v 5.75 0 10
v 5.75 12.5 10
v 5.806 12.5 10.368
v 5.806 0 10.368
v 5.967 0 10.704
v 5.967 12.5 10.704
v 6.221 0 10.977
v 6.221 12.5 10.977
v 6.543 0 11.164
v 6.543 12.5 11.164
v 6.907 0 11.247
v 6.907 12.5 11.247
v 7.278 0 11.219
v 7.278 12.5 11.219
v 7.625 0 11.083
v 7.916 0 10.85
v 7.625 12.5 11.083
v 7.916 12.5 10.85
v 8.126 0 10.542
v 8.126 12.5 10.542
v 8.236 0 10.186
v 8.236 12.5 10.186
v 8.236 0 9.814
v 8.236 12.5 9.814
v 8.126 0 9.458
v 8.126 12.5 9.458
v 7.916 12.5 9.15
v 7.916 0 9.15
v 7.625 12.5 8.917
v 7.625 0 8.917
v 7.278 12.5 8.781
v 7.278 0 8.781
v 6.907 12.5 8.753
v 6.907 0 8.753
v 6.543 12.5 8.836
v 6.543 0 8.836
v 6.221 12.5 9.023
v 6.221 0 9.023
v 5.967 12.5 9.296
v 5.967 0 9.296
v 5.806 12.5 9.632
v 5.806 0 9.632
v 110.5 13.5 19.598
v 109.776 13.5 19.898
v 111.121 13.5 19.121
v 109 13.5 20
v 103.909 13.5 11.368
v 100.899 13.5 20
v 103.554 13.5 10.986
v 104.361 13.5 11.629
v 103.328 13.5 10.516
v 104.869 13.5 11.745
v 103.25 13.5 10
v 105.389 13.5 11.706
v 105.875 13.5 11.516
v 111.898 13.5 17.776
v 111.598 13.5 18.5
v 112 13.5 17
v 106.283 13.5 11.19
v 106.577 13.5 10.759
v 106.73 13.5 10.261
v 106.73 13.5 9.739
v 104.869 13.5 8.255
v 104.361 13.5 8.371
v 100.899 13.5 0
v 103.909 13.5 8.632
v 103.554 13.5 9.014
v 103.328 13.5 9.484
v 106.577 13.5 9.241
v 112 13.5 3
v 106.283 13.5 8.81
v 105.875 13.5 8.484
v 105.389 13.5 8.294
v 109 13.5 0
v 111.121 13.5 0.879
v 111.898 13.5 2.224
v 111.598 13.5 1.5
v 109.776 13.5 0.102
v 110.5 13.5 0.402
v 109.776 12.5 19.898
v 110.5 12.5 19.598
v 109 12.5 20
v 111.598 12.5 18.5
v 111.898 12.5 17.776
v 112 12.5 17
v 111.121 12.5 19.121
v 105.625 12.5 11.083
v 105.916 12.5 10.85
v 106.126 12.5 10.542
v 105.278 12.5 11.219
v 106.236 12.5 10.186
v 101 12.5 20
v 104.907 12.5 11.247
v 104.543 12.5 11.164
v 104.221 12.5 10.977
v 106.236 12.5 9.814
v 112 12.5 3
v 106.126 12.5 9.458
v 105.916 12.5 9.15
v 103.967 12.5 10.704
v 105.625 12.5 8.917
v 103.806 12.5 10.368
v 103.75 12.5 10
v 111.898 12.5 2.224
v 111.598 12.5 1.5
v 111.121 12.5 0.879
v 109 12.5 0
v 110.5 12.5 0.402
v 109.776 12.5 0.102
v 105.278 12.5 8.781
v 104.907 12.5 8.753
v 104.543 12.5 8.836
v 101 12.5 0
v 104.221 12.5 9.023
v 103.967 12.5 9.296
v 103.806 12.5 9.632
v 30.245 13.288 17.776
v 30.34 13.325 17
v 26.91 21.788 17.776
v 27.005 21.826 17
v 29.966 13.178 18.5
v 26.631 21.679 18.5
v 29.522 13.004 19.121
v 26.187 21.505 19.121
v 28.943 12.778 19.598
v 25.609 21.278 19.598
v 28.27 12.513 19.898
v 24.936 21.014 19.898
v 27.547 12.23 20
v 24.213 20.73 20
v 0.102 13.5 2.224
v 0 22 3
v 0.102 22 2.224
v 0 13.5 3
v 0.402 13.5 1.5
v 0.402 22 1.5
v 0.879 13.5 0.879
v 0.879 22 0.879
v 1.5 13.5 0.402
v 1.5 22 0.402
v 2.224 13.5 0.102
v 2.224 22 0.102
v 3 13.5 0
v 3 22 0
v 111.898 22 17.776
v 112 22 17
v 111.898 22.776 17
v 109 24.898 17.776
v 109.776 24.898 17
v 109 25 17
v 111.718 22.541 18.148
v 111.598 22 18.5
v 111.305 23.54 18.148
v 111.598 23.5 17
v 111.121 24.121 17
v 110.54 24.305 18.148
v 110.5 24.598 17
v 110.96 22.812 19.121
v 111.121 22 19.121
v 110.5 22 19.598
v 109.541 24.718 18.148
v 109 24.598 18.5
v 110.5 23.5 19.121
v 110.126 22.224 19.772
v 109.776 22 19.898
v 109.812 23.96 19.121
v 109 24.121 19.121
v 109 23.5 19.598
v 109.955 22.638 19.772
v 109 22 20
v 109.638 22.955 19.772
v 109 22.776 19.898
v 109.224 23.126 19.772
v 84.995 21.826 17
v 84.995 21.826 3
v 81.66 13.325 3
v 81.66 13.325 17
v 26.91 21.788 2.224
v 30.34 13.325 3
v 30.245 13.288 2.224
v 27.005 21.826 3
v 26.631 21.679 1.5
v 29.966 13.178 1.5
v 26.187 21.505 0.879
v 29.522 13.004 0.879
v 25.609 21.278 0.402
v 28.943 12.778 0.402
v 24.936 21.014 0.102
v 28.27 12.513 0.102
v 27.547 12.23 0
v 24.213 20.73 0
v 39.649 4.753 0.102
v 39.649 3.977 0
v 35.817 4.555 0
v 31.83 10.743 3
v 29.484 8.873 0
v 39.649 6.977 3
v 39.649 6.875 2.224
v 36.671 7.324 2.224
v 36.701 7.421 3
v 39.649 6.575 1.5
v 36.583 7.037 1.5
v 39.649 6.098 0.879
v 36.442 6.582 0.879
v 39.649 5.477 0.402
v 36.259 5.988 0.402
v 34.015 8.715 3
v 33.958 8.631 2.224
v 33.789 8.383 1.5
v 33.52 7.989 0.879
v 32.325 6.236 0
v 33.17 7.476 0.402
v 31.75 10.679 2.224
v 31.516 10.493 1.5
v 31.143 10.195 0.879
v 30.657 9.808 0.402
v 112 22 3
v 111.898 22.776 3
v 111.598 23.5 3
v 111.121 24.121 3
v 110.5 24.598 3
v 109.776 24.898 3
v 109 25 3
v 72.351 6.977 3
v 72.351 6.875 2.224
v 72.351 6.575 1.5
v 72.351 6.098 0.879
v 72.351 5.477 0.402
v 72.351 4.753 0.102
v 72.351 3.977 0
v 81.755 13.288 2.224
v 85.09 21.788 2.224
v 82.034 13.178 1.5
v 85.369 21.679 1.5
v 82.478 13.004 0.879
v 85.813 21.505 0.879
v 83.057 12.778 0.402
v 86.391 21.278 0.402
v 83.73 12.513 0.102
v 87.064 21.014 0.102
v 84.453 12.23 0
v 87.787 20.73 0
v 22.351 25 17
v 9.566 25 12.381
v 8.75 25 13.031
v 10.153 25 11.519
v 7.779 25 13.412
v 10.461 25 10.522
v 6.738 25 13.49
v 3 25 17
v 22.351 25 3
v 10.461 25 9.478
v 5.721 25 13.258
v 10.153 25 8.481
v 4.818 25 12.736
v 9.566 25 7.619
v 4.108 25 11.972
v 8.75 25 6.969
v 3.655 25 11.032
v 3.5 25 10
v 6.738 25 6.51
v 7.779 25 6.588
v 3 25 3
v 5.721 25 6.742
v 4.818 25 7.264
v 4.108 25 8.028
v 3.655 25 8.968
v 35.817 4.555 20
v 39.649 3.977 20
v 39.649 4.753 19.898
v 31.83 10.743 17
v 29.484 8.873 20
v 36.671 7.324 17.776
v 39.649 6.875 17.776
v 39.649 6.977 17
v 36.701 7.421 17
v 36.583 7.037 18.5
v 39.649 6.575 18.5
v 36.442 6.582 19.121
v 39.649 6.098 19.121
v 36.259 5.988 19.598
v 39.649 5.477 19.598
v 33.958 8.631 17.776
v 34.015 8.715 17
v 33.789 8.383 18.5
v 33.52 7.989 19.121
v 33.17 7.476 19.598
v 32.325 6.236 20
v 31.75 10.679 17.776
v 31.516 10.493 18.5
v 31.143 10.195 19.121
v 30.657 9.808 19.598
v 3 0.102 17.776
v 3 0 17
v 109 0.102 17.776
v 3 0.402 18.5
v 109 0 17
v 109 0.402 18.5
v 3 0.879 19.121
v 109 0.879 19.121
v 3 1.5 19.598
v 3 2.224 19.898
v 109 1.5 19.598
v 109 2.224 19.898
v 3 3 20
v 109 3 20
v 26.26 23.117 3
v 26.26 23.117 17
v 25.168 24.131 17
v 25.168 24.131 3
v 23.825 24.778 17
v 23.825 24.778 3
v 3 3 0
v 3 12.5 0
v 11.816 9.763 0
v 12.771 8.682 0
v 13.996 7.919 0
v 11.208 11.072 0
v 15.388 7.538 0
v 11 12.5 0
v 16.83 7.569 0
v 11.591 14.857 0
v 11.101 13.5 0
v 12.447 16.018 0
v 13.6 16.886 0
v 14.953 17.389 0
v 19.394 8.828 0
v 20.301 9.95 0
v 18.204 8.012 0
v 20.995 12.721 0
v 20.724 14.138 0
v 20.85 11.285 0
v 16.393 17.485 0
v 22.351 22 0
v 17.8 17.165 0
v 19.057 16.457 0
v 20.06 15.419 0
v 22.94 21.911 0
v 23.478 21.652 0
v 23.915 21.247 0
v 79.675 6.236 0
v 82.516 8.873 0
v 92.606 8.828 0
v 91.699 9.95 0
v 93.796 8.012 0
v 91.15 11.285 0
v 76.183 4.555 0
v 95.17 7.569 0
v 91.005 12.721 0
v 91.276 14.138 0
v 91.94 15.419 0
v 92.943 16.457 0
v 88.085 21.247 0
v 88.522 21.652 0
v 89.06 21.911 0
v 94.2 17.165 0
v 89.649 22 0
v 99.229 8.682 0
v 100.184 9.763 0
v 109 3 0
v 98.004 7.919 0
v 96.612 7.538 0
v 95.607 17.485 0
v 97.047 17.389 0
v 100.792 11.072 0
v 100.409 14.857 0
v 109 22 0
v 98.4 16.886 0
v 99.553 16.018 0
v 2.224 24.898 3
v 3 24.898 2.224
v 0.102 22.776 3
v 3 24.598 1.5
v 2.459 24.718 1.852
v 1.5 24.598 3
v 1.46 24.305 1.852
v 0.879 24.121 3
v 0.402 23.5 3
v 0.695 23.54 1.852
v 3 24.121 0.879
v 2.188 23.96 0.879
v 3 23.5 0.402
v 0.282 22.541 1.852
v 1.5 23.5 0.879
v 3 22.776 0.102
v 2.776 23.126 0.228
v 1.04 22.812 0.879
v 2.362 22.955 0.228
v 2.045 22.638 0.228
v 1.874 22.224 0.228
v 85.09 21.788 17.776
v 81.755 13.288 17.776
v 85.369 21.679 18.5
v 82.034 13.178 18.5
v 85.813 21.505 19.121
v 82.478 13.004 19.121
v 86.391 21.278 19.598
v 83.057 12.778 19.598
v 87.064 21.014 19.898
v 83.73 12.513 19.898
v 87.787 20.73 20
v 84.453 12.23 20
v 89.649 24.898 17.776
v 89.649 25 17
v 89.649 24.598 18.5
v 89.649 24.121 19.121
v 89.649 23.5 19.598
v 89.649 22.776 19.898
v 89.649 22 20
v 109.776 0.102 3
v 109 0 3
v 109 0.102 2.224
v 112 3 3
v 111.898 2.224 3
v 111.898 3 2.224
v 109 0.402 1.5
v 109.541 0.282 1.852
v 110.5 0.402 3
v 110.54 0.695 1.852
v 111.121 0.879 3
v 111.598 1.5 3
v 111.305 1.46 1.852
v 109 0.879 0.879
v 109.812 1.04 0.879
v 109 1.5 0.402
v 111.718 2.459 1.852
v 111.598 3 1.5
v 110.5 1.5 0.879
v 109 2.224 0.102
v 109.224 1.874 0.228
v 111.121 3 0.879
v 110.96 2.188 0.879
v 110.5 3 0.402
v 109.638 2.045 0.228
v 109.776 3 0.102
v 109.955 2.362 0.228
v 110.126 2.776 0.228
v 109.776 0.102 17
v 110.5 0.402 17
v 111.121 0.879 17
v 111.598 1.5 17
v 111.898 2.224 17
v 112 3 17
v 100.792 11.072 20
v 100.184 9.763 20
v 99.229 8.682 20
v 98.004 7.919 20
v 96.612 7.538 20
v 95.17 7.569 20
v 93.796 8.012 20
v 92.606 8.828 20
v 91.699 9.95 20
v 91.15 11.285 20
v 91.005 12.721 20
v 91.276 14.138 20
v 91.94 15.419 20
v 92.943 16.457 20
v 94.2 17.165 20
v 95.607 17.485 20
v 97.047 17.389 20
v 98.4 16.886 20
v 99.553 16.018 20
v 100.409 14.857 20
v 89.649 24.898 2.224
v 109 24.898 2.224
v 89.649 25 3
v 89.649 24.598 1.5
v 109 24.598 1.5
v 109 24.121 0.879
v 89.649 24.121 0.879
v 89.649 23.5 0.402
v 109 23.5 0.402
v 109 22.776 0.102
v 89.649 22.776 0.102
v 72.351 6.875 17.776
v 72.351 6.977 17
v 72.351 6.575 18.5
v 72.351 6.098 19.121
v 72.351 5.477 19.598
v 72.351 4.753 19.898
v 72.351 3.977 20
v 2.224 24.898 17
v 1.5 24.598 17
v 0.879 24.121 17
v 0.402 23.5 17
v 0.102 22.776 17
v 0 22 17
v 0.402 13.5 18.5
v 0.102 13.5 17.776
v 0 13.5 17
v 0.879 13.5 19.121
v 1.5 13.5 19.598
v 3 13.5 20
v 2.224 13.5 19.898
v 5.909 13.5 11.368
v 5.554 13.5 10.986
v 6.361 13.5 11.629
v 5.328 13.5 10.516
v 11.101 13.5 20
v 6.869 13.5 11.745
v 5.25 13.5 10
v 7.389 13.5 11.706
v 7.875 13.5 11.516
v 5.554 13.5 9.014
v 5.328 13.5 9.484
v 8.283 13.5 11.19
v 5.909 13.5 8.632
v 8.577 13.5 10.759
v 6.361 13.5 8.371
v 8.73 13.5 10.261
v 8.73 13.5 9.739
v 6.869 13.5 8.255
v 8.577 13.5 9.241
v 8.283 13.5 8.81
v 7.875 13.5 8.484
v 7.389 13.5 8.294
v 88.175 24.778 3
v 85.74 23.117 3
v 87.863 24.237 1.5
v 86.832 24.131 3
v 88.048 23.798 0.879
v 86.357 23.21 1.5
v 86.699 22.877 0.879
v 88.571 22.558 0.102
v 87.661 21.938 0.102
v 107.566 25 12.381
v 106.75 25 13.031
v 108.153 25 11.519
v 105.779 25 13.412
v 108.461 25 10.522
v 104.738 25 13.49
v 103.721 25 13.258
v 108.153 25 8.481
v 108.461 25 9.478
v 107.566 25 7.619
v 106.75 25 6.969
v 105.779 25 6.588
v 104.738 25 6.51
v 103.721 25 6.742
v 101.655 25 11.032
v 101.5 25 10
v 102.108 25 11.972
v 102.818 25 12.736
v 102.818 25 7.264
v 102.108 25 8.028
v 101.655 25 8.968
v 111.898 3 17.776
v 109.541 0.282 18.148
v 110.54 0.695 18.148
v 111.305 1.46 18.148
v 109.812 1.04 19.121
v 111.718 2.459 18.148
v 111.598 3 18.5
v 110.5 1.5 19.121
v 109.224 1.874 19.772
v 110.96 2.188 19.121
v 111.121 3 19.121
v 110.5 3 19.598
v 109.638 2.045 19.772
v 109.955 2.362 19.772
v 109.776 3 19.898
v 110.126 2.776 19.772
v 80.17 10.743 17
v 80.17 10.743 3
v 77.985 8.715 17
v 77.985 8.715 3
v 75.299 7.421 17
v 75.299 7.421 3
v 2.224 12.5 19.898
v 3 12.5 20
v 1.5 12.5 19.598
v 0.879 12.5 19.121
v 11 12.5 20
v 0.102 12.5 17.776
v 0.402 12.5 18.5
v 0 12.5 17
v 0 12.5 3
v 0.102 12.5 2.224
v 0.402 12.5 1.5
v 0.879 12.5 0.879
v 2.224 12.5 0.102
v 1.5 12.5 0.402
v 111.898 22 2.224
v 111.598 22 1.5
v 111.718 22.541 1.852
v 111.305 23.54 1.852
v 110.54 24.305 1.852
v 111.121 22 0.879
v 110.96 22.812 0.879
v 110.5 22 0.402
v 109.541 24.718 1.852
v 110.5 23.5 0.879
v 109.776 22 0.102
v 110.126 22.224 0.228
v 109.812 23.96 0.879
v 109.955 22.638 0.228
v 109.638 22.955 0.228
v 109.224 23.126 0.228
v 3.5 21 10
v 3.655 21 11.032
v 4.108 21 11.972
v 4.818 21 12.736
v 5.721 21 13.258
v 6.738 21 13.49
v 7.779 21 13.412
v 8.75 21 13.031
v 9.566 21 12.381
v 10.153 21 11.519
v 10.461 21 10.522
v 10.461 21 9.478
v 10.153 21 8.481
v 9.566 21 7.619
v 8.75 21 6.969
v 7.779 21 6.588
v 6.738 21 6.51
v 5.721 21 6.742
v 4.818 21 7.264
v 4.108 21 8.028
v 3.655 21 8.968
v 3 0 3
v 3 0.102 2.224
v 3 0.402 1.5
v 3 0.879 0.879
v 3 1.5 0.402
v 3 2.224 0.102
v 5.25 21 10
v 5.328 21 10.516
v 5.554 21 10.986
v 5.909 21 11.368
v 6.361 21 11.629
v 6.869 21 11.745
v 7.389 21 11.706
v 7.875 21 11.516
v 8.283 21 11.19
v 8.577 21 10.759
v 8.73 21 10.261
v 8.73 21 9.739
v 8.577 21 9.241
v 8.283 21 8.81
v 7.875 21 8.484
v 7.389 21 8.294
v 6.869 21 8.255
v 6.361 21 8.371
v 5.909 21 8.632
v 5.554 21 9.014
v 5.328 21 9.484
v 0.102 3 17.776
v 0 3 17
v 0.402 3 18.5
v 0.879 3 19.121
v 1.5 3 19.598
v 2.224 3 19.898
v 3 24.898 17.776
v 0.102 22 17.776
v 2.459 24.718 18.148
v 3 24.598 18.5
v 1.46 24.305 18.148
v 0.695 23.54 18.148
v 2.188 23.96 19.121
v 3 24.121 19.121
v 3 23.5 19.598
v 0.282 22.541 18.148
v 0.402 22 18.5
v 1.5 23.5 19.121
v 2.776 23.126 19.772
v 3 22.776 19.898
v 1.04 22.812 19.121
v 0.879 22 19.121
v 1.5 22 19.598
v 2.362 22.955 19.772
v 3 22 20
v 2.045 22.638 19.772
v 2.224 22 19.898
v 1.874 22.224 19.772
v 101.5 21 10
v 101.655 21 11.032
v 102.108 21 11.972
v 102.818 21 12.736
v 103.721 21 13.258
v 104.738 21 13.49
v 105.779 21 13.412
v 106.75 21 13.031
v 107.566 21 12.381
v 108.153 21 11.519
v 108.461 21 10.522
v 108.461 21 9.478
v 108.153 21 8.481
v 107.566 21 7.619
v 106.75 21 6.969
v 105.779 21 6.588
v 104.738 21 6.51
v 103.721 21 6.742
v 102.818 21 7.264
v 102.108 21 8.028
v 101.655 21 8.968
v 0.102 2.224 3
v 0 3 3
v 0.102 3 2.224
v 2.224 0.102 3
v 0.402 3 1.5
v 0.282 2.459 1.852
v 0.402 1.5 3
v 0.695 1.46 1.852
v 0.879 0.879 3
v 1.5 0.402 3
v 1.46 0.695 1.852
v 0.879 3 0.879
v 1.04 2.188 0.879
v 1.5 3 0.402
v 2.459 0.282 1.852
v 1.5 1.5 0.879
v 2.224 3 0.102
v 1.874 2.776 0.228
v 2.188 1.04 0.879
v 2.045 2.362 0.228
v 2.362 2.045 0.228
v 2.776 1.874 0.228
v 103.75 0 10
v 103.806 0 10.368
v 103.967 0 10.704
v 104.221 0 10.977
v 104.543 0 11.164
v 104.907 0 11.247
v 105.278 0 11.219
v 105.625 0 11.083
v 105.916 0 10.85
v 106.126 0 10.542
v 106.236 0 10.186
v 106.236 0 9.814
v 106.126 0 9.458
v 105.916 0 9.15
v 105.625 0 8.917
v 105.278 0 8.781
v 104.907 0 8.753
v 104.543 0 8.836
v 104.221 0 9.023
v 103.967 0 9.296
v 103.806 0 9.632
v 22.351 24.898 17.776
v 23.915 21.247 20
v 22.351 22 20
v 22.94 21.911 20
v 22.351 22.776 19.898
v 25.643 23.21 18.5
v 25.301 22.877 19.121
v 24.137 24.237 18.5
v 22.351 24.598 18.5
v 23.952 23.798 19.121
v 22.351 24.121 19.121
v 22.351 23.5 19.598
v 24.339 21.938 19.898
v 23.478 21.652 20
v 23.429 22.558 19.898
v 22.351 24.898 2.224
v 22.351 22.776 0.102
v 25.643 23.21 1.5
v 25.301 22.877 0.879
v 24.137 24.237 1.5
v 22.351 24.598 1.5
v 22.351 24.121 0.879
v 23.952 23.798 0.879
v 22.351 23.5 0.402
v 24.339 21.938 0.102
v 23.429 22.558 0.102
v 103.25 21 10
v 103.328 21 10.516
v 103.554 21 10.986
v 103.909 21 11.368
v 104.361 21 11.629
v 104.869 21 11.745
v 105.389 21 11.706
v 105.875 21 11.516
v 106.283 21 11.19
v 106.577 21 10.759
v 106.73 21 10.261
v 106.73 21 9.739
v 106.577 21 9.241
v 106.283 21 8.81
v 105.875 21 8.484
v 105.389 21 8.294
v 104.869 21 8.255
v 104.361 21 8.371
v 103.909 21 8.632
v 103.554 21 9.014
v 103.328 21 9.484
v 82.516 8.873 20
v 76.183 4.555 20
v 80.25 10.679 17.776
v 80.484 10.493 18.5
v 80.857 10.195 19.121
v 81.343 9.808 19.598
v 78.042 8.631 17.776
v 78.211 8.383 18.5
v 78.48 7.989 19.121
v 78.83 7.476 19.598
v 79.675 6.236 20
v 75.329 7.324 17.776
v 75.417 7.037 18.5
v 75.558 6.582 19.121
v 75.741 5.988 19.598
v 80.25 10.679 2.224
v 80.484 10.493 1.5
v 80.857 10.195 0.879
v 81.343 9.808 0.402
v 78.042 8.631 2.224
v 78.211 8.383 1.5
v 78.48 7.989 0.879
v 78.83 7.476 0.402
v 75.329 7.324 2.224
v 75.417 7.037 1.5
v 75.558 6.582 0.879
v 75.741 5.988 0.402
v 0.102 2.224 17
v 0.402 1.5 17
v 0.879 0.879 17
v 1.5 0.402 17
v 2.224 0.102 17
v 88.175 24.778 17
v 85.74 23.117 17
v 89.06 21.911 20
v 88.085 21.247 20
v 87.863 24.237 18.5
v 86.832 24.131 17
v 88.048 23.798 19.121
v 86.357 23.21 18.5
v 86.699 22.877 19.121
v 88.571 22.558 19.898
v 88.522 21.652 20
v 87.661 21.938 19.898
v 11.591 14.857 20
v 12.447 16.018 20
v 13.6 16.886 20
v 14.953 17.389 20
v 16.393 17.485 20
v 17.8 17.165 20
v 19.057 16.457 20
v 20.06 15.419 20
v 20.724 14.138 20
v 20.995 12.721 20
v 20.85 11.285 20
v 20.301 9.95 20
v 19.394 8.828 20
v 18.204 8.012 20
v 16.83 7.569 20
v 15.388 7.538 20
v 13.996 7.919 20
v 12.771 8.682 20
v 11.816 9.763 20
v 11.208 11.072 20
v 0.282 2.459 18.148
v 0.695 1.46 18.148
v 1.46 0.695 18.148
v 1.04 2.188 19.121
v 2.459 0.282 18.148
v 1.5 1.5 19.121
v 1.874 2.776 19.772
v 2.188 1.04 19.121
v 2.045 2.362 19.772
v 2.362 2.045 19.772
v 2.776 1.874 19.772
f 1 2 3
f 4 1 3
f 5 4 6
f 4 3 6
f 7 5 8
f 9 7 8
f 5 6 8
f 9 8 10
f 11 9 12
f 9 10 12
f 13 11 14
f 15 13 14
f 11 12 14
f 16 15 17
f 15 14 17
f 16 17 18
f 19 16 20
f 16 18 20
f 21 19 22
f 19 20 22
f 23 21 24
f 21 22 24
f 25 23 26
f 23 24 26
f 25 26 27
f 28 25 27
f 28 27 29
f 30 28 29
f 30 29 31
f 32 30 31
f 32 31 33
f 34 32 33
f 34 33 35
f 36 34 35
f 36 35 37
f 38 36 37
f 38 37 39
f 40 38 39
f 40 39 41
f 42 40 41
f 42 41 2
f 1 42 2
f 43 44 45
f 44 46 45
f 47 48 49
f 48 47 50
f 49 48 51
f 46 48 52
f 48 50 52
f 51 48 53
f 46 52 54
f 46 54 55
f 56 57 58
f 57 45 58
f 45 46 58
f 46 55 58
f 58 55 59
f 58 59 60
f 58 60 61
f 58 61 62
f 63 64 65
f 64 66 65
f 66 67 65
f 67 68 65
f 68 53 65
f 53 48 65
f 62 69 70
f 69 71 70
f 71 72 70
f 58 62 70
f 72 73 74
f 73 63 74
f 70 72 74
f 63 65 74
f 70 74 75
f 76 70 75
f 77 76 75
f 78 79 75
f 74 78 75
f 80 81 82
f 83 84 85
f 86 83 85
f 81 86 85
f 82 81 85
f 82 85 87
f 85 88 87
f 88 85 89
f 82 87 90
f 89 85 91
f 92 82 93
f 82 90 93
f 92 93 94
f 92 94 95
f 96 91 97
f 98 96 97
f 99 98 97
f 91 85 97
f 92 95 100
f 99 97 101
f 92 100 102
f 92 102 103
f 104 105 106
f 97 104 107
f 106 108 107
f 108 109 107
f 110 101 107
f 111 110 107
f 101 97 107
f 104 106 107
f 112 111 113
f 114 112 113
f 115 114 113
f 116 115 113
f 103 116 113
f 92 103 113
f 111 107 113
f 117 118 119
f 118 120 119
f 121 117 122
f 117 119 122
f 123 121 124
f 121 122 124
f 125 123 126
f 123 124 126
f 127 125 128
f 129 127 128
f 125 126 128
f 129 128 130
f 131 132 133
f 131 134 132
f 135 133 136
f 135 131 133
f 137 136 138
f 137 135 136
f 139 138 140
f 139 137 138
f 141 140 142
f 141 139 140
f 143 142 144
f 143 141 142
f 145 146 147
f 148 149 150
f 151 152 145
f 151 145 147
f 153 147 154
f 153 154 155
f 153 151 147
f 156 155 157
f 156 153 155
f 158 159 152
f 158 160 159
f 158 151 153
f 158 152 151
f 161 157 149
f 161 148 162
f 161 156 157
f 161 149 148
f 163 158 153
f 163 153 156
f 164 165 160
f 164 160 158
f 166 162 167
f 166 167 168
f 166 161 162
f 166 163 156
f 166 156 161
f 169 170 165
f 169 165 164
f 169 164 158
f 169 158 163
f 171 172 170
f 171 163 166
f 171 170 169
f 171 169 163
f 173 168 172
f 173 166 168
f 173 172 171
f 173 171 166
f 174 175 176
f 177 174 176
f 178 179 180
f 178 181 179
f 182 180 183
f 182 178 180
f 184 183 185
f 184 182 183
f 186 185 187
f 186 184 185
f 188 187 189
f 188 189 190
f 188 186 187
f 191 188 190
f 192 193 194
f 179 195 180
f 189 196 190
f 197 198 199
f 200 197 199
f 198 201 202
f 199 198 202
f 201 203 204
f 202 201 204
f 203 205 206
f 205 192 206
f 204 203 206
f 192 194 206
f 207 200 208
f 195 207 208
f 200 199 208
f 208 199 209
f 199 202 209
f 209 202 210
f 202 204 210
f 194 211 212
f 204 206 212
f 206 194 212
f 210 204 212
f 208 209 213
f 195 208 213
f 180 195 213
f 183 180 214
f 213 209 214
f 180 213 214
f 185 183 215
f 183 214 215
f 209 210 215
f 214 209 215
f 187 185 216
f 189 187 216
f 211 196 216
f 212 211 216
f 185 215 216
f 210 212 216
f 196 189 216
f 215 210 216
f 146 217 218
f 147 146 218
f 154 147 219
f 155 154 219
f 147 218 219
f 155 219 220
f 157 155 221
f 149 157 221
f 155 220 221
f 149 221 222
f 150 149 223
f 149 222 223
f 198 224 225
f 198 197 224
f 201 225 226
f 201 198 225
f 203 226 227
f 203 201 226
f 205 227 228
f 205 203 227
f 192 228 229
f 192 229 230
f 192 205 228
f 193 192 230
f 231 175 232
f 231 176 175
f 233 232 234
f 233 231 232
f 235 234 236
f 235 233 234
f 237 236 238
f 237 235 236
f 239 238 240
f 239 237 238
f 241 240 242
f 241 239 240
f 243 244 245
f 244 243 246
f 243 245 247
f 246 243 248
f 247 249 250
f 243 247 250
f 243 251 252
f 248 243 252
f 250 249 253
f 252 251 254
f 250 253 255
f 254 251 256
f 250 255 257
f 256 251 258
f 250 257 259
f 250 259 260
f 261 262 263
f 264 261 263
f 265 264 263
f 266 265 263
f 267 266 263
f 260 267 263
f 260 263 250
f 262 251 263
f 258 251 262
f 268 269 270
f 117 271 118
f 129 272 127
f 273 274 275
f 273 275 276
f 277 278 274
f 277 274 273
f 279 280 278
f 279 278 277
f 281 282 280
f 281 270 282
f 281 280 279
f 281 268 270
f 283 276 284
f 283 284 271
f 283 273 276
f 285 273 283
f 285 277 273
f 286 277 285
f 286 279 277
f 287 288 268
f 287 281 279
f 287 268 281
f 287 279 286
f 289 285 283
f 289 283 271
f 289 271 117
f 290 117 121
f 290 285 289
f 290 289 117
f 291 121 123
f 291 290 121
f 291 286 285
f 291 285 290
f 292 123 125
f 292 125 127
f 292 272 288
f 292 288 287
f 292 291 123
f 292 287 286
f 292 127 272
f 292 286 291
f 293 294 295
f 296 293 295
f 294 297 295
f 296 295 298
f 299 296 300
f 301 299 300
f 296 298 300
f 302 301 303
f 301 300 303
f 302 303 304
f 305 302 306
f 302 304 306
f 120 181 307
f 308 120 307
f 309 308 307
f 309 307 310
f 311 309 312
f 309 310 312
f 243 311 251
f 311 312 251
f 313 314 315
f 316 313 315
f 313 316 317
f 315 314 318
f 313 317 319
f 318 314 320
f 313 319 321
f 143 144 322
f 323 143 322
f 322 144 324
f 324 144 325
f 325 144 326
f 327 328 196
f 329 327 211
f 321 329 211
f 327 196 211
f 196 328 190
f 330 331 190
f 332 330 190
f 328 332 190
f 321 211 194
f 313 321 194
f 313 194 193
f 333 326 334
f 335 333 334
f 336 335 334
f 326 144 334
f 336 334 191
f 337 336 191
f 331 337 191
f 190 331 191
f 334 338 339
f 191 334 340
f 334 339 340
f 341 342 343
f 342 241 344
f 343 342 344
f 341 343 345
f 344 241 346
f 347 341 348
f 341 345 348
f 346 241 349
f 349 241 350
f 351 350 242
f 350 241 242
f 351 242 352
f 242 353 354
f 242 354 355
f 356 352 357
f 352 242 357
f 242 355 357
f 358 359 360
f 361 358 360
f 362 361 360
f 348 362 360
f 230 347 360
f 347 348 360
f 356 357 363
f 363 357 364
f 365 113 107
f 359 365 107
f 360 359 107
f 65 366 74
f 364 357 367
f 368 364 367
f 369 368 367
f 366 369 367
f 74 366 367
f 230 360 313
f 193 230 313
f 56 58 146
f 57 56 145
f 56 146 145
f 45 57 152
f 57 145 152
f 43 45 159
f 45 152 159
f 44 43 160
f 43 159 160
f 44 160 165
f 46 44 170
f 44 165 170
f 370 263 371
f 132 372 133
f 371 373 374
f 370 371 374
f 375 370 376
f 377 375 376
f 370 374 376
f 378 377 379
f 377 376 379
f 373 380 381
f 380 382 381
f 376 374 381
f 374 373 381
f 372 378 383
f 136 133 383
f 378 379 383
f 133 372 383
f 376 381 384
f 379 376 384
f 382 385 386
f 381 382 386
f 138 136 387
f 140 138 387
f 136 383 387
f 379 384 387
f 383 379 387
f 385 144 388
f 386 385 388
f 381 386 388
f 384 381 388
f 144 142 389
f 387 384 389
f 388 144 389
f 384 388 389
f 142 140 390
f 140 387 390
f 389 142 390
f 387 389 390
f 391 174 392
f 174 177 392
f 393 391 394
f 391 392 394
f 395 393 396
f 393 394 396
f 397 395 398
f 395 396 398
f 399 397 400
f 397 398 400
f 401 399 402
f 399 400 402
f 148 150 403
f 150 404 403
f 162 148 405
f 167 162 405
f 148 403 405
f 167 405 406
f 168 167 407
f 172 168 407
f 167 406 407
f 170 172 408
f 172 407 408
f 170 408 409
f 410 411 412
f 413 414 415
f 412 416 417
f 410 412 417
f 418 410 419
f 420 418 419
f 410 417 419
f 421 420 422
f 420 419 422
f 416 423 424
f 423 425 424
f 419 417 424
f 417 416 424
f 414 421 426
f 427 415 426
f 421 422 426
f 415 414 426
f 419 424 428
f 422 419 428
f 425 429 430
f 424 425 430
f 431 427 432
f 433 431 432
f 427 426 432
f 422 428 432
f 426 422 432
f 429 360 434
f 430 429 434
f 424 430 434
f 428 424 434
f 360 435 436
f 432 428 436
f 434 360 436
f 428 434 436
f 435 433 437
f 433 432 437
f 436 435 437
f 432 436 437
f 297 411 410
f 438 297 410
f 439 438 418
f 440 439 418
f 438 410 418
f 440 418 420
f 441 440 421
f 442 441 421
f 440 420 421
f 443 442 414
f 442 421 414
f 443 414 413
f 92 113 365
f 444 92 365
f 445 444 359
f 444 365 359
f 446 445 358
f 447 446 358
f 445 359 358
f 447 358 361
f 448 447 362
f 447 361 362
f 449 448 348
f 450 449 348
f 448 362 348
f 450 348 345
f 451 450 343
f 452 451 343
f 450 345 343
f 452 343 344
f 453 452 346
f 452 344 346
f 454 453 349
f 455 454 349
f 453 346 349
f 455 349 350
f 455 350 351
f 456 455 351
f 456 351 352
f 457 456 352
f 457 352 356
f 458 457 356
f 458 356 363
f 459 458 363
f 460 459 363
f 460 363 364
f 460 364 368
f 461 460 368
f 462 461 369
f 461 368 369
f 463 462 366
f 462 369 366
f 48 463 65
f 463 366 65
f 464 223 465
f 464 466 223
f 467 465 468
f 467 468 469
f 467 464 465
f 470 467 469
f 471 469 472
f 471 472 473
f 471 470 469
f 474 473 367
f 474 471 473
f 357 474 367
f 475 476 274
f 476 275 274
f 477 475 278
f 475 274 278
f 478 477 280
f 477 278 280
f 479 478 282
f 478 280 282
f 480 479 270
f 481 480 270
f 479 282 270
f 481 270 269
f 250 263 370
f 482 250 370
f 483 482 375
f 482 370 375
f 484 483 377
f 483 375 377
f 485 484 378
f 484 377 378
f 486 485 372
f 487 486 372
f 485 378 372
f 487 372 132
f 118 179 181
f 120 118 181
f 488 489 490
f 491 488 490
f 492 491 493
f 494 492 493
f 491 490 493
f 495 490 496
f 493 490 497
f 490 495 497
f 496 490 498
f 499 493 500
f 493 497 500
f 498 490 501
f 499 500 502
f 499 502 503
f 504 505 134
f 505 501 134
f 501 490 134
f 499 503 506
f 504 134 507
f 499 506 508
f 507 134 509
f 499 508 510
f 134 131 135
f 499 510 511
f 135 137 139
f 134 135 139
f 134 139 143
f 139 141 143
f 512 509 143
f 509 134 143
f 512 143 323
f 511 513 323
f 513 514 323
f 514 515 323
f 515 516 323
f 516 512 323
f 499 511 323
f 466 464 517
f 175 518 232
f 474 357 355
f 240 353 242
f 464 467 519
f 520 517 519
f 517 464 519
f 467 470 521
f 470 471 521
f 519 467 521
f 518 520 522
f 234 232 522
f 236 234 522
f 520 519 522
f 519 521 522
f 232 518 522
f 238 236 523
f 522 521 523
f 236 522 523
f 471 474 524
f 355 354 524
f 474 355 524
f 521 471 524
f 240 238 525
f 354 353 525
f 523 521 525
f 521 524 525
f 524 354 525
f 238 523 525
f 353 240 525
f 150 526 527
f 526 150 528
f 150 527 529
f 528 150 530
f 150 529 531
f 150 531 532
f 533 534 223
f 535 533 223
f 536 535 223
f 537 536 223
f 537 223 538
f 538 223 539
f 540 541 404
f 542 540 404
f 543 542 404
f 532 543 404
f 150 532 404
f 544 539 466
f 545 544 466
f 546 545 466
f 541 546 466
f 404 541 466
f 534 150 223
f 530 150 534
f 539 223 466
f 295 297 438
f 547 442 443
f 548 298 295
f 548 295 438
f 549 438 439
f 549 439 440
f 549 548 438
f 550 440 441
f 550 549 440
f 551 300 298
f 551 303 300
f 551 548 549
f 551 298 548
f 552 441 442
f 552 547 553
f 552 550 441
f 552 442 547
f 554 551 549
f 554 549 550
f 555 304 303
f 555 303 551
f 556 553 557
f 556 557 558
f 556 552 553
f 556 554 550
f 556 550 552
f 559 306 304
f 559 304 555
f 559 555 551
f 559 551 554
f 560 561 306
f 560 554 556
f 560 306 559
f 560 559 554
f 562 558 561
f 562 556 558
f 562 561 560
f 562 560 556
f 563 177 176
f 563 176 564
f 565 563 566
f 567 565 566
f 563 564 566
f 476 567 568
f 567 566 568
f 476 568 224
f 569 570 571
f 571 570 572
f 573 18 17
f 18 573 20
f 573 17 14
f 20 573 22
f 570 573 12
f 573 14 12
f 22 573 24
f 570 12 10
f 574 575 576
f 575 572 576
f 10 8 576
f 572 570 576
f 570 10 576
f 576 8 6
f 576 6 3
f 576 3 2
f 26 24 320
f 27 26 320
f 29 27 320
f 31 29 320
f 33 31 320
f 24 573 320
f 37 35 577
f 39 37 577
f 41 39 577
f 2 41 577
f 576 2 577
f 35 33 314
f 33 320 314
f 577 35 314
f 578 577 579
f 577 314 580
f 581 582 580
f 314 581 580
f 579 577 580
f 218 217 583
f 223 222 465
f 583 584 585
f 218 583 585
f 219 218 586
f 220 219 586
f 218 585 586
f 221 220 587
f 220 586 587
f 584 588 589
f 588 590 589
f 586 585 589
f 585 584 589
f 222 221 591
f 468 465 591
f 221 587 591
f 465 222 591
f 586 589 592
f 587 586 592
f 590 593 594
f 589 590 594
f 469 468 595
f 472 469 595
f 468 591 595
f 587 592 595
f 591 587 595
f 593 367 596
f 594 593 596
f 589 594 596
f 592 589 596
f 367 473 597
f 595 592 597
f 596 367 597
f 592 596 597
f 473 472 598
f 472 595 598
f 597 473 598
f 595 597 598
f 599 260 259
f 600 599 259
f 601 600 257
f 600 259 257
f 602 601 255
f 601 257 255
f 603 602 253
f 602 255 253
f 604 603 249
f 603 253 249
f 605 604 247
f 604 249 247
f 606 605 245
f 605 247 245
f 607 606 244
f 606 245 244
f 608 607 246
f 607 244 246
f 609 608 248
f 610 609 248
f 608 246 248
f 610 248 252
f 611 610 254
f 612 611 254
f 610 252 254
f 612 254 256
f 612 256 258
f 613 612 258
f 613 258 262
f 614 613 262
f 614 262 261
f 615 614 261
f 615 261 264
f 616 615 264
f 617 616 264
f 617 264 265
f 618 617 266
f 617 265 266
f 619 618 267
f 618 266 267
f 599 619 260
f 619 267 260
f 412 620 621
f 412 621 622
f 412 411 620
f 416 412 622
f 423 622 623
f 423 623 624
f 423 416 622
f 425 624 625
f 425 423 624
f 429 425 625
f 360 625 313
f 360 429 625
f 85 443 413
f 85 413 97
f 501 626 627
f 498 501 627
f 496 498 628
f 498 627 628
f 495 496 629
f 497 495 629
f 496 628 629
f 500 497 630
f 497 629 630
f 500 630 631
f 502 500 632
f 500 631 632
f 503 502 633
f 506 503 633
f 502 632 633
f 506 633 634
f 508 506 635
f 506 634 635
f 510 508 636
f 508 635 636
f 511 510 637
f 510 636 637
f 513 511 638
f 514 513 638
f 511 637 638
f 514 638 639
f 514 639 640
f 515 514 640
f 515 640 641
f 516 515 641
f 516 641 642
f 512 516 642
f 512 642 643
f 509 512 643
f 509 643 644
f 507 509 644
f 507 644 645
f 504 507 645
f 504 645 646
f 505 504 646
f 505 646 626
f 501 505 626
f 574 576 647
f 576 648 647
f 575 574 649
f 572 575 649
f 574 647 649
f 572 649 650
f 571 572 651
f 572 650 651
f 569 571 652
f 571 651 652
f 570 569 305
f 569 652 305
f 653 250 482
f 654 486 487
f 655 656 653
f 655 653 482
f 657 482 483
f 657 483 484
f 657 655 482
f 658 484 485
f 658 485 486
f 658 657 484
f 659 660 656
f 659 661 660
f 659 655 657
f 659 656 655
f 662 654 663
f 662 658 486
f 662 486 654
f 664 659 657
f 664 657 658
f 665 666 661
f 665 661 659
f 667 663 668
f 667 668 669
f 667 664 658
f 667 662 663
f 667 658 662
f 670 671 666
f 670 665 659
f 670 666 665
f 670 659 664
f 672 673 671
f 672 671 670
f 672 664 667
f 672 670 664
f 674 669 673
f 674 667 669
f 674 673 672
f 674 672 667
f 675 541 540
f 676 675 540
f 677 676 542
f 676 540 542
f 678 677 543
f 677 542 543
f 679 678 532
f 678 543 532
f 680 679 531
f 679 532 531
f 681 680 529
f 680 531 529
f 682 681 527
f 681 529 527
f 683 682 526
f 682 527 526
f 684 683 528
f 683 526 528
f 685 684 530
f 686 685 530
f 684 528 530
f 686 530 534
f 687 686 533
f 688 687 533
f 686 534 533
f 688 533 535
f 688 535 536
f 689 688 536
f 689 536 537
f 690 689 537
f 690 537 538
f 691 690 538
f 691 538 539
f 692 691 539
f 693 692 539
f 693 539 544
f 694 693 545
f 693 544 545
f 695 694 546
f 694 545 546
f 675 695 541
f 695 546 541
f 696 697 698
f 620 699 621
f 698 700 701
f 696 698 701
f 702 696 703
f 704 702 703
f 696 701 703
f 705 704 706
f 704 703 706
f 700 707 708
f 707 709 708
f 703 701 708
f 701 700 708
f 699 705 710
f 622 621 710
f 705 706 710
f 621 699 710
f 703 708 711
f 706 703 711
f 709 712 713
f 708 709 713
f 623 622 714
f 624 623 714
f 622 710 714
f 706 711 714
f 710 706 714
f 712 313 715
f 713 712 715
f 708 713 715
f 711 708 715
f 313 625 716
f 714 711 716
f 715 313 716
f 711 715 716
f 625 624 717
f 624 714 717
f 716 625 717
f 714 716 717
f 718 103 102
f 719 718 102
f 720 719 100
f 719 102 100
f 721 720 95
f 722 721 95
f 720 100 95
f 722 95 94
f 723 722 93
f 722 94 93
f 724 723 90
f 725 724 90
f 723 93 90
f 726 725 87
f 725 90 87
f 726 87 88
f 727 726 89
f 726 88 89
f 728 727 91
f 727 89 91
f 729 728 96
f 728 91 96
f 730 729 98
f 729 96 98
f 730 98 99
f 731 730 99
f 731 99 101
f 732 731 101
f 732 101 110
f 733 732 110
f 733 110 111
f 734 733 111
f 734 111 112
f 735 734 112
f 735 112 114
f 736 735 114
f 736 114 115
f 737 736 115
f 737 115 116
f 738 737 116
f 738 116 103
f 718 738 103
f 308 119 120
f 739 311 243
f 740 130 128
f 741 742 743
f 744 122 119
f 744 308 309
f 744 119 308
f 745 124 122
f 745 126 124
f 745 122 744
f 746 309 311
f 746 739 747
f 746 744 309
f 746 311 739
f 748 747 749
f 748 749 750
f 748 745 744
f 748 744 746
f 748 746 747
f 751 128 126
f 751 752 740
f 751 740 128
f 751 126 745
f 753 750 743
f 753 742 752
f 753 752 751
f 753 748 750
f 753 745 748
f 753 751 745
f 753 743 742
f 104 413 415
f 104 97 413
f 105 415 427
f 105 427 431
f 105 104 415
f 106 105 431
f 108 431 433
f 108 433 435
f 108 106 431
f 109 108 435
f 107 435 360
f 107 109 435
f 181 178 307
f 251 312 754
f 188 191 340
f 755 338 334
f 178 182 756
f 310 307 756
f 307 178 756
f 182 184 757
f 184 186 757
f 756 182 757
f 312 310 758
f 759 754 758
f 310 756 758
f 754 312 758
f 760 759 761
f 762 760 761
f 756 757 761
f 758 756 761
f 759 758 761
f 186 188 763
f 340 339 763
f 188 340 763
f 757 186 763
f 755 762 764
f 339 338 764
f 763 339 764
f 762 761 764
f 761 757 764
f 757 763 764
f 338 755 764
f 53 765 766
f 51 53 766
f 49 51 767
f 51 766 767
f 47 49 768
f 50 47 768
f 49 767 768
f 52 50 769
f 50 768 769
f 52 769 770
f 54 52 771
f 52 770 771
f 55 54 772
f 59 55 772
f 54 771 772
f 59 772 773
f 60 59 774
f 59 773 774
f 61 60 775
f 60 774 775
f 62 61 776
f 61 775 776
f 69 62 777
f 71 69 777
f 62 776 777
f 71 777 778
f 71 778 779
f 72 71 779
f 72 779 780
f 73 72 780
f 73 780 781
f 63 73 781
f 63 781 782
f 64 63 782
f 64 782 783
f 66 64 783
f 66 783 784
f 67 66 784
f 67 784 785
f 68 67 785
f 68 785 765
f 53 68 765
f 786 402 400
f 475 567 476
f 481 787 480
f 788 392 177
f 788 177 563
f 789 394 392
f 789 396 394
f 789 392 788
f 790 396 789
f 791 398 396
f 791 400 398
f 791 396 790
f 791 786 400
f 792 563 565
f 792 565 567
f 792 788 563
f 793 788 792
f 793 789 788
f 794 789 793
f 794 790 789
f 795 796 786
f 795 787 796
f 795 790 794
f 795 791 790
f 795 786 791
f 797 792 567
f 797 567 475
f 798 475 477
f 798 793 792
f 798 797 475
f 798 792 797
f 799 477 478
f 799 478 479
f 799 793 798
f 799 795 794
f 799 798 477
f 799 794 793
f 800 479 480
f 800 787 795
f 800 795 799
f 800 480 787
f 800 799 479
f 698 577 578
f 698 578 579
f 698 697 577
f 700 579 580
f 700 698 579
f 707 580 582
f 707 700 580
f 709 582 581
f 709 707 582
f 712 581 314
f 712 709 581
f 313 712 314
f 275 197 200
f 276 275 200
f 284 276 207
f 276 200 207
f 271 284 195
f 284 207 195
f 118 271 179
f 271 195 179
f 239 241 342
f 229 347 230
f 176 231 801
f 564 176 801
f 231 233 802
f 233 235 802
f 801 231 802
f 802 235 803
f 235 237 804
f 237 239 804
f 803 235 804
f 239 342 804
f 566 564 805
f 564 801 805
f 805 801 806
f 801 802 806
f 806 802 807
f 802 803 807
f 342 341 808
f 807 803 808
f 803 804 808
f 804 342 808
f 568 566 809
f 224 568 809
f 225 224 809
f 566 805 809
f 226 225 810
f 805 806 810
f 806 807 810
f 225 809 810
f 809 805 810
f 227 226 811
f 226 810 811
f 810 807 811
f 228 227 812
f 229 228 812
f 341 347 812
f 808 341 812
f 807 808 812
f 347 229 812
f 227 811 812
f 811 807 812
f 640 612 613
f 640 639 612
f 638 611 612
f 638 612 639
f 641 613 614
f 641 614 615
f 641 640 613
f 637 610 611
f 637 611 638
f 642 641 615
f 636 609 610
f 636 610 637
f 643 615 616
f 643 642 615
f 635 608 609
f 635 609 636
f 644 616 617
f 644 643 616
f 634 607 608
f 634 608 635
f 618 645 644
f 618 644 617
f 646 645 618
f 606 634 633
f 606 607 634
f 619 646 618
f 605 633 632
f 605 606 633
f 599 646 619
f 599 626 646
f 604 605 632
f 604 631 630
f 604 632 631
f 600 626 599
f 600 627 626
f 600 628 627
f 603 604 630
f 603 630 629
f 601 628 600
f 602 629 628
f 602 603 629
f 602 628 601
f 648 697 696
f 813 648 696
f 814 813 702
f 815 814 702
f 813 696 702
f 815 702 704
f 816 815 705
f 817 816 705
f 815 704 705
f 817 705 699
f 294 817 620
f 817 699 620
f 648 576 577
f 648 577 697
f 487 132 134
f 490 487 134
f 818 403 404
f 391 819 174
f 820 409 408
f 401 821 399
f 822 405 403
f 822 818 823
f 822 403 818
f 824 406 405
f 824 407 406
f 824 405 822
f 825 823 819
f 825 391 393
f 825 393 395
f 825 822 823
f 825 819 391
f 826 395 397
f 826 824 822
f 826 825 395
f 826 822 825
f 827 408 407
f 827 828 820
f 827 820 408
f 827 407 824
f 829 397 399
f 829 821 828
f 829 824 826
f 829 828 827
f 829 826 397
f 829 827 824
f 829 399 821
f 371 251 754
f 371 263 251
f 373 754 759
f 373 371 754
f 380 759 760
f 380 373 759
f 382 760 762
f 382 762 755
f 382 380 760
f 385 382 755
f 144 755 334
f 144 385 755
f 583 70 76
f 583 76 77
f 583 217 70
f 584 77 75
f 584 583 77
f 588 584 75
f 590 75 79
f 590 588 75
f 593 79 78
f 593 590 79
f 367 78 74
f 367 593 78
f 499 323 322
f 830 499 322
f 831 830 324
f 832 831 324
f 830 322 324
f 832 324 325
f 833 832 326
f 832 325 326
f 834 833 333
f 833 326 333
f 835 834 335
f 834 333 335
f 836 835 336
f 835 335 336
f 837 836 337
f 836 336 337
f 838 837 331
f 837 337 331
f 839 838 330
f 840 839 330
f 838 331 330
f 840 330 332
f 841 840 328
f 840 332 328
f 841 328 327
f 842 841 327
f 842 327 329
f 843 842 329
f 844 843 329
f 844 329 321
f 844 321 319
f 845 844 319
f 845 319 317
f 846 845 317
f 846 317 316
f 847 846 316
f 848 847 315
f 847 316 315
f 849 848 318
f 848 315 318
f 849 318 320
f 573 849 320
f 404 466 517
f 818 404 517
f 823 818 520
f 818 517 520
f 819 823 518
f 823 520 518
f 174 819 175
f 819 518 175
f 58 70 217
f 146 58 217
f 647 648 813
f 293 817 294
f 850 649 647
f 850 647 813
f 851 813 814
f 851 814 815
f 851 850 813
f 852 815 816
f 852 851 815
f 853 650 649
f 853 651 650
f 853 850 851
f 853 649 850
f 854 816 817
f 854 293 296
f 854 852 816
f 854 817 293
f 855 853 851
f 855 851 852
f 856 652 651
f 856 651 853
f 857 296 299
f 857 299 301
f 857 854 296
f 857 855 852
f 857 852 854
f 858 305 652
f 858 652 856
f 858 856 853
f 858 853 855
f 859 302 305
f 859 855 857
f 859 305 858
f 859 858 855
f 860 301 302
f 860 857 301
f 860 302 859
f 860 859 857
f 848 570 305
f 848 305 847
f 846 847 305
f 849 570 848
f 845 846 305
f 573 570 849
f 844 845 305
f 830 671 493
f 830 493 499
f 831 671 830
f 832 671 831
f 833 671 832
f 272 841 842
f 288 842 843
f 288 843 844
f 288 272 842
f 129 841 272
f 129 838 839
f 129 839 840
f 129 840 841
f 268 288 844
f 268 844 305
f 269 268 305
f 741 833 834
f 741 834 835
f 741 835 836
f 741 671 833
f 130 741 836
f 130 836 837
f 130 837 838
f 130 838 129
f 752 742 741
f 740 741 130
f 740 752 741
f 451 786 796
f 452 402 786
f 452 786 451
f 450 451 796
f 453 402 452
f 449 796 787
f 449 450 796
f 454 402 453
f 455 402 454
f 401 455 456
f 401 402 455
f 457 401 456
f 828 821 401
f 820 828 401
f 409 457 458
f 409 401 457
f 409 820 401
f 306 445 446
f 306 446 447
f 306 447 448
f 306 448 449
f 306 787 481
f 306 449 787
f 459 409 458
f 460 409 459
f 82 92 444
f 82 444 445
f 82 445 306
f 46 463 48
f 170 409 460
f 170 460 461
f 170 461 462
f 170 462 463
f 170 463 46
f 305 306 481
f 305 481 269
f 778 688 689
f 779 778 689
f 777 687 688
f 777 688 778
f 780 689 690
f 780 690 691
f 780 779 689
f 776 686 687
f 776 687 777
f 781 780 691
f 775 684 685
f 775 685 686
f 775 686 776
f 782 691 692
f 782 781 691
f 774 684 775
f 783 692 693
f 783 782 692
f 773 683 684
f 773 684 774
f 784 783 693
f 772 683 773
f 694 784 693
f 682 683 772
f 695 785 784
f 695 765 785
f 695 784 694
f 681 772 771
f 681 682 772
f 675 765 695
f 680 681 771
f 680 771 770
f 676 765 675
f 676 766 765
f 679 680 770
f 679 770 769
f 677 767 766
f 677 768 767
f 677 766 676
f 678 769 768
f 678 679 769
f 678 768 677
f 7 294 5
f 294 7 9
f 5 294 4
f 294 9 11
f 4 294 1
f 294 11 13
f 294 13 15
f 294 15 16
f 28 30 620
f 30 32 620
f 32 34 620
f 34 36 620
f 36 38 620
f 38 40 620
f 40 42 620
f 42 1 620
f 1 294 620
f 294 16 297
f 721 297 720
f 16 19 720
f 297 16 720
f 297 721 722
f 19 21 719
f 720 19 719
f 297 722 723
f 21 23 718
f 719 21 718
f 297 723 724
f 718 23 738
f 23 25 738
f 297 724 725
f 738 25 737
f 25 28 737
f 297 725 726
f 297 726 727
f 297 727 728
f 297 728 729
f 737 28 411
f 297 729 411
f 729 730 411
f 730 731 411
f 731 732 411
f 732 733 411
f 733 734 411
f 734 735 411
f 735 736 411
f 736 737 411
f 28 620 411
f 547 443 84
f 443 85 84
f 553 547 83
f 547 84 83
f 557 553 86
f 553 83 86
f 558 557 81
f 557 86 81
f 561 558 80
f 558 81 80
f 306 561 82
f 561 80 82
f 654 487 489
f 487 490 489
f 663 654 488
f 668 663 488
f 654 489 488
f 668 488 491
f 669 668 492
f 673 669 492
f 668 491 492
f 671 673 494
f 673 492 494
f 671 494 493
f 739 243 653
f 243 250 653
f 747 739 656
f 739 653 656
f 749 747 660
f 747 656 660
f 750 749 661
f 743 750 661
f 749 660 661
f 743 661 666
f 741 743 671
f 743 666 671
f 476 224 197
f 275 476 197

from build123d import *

# Parameters (mm, degrees)
F1_DEPTH  = 20
F2_R      = 3
F3_R      = 1.25
F4_DEPTH  = 30
F3_R_2    = 1.75
F5_DEPTH  = 12
F3_R_3    = 3.5
F6_DEPTH  = 4
F7_R      = 1.25
F8_DEPTH  = 30
F7_R_2    = 1.75
F9_DEPTH  = 12
F7_R_3    = 3.5
F10_DEPTH = 4


# Not quite as in the source:
# - a feature names something its author has since deleted; it is built from what else it names


with BuildPart() as f1:
    # F0 (on Top) → F1 (new body)
    with BuildSketch(Plane.XY):
        with BuildLine():
            Line((3, 0), (56, 0))
            Line((56, 0), (109, 0))
            ThreePointArc((109, 0), (111.1213203436, 0.8786796564), (112, 3))
            Line((112, 3), (112, 12.5))
            Line((112, 12.5), (101, 12.5))
            ThreePointArc((101, 12.5), (91.025319235, 11.99745519), (100.8989794856, 13.5))
            Line((100.8989794856, 13.5), (112, 13.5))
            Line((112, 13.5), (112, 22))
            ThreePointArc((112, 22), (111.1213203436, 24.1213203436), (109, 25))
            Line((109, 25), (95.7940161003, 25))
            Line((95.7940161003, 25), (92, 25))
            Line((92, 25), (89.649228215, 25))
            ThreePointArc((89.649228215, 25), (86.8322254301, 24.1309194267), (84.9945036033, 21.825798124))
            Line((84.9945036033, 21.825798124), (81.660193975, 13.3252454689))
            ThreePointArc((81.660193975, 13.3252454689), (77.9847503214, 8.7150028635), (72.3507447516, 6.9768417168))
            Line((72.3507447516, 6.9768417168), (61.9619729666, 6.9768417168))
            Line((61.9619729666, 6.9768417168), (56, 6.9768417168))
            Line((56, 6.9768417168), (50.0380270334, 6.9768417168))
            Line((50.0380270334, 6.9768417168), (39.6492552484, 6.9768417168))
            ThreePointArc((39.6492552484, 6.9768417168), (34.0152496786, 8.7150028635), (30.339806025, 13.3252454689))
            Line((30.339806025, 13.3252454689), (27.0054963967, 21.825798124))
            ThreePointArc((27.0054963967, 21.825798124), (25.1677745699, 24.1309194267), (22.350771785, 25))
            Line((22.350771785, 25), (20, 25))
            Line((20, 25), (16.2059838997, 25))
            Line((16.2059838997, 25), (3, 25))
            ThreePointArc((3, 25), (0.8786796564, 24.1213203436), (0, 22))
            Line((0, 22), (0, 13.5))
            Line((0, 13.5), (11.1010205144, 13.5))
            ThreePointArc((11.1010205144, 13.5), (20.974680765, 11.99745519), (11, 12.5))
            Line((11, 12.5), (0, 12.5))
            Line((0, 12.5), (0, 3))
            ThreePointArc((0, 3), (0.8786796564, 0.8786796564), (3, 0))
        make_face()
    extrude(amount=F1_DEPTH)

    # F2
    f2_edges = [f1.edges().sort_by_distance(p)[0] for p in [
        (56, 0, 20),
        (99.324614, 25, 20),
        (56, 0, 0),
        (99.324614, 25, 0),
    ]]
    fillet(f2_edges, radius=F2_R)

    # F3 (on face) → F4 (cut)
    with BuildSketch(Plane(origin=(0, 25, 0), x_dir=(-1, 0, 0), z_dir=(0, 1, 0))):
        with Locations((-7, 10)):
            Circle(F3_R)
    extrude(amount=-F4_DEPTH, mode=Mode.SUBTRACT)

    # F3 (on face) → F5 (cut)
    with BuildSketch(Plane(origin=(0, 25, 0), x_dir=(-1, 0, 0), z_dir=(0, 1, 0))):
        with Locations((-7, 10)):
            Circle(F3_R_2)
        with Locations((-7, 10)):
            Circle(F3_R, mode=Mode.SUBTRACT)
    extrude(amount=-F5_DEPTH, mode=Mode.SUBTRACT)

    # F3 (on face) → F6 (cut)
    with BuildSketch(Plane(origin=(0, 25, 0), x_dir=(-1, 0, 0), z_dir=(0, 1, 0))):
        with Locations((-7, 10)):
            Circle(F3_R_3)
        with Locations((-7, 10)):
            Circle(F3_R_2, mode=Mode.SUBTRACT)
        with Locations((-7, 10)):
            Circle(F3_R_2)
        with Locations((-7, 10)):
            Circle(F3_R, mode=Mode.SUBTRACT)
        with Locations((-7, 10)):
            Circle(F3_R)
    extrude(amount=-F6_DEPTH, mode=Mode.SUBTRACT)

    # F7 (on face) → F8 (cut)
    with BuildSketch(Plane(origin=(0, 25, 0), x_dir=(-1, 0, 0), z_dir=(0, 1, 0))):
        with Locations((-105, 10)):
            Circle(F7_R)
    extrude(amount=-F8_DEPTH, mode=Mode.SUBTRACT)

    # F7 (on face) → F9 (cut)
    with BuildSketch(Plane(origin=(0, 25, 0), x_dir=(-1, 0, 0), z_dir=(0, 1, 0))):
        with Locations((-105, 10)):
            Circle(F7_R_2)
        with Locations((-105, 10)):
            Circle(F7_R, mode=Mode.SUBTRACT)
    extrude(amount=-F9_DEPTH, mode=Mode.SUBTRACT)

    # F7 (on face) → F10 (cut)
    with BuildSketch(Plane(origin=(0, 25, 0), x_dir=(-1, 0, 0), z_dir=(0, 1, 0))):
        with Locations((-105, 10)):
            Circle(F7_R_3)
        with Locations((-105, 10)):
            Circle(F7_R_2, mode=Mode.SUBTRACT)
    extrude(amount=-F10_DEPTH, mode=Mode.SUBTRACT)


solid = f1.part
